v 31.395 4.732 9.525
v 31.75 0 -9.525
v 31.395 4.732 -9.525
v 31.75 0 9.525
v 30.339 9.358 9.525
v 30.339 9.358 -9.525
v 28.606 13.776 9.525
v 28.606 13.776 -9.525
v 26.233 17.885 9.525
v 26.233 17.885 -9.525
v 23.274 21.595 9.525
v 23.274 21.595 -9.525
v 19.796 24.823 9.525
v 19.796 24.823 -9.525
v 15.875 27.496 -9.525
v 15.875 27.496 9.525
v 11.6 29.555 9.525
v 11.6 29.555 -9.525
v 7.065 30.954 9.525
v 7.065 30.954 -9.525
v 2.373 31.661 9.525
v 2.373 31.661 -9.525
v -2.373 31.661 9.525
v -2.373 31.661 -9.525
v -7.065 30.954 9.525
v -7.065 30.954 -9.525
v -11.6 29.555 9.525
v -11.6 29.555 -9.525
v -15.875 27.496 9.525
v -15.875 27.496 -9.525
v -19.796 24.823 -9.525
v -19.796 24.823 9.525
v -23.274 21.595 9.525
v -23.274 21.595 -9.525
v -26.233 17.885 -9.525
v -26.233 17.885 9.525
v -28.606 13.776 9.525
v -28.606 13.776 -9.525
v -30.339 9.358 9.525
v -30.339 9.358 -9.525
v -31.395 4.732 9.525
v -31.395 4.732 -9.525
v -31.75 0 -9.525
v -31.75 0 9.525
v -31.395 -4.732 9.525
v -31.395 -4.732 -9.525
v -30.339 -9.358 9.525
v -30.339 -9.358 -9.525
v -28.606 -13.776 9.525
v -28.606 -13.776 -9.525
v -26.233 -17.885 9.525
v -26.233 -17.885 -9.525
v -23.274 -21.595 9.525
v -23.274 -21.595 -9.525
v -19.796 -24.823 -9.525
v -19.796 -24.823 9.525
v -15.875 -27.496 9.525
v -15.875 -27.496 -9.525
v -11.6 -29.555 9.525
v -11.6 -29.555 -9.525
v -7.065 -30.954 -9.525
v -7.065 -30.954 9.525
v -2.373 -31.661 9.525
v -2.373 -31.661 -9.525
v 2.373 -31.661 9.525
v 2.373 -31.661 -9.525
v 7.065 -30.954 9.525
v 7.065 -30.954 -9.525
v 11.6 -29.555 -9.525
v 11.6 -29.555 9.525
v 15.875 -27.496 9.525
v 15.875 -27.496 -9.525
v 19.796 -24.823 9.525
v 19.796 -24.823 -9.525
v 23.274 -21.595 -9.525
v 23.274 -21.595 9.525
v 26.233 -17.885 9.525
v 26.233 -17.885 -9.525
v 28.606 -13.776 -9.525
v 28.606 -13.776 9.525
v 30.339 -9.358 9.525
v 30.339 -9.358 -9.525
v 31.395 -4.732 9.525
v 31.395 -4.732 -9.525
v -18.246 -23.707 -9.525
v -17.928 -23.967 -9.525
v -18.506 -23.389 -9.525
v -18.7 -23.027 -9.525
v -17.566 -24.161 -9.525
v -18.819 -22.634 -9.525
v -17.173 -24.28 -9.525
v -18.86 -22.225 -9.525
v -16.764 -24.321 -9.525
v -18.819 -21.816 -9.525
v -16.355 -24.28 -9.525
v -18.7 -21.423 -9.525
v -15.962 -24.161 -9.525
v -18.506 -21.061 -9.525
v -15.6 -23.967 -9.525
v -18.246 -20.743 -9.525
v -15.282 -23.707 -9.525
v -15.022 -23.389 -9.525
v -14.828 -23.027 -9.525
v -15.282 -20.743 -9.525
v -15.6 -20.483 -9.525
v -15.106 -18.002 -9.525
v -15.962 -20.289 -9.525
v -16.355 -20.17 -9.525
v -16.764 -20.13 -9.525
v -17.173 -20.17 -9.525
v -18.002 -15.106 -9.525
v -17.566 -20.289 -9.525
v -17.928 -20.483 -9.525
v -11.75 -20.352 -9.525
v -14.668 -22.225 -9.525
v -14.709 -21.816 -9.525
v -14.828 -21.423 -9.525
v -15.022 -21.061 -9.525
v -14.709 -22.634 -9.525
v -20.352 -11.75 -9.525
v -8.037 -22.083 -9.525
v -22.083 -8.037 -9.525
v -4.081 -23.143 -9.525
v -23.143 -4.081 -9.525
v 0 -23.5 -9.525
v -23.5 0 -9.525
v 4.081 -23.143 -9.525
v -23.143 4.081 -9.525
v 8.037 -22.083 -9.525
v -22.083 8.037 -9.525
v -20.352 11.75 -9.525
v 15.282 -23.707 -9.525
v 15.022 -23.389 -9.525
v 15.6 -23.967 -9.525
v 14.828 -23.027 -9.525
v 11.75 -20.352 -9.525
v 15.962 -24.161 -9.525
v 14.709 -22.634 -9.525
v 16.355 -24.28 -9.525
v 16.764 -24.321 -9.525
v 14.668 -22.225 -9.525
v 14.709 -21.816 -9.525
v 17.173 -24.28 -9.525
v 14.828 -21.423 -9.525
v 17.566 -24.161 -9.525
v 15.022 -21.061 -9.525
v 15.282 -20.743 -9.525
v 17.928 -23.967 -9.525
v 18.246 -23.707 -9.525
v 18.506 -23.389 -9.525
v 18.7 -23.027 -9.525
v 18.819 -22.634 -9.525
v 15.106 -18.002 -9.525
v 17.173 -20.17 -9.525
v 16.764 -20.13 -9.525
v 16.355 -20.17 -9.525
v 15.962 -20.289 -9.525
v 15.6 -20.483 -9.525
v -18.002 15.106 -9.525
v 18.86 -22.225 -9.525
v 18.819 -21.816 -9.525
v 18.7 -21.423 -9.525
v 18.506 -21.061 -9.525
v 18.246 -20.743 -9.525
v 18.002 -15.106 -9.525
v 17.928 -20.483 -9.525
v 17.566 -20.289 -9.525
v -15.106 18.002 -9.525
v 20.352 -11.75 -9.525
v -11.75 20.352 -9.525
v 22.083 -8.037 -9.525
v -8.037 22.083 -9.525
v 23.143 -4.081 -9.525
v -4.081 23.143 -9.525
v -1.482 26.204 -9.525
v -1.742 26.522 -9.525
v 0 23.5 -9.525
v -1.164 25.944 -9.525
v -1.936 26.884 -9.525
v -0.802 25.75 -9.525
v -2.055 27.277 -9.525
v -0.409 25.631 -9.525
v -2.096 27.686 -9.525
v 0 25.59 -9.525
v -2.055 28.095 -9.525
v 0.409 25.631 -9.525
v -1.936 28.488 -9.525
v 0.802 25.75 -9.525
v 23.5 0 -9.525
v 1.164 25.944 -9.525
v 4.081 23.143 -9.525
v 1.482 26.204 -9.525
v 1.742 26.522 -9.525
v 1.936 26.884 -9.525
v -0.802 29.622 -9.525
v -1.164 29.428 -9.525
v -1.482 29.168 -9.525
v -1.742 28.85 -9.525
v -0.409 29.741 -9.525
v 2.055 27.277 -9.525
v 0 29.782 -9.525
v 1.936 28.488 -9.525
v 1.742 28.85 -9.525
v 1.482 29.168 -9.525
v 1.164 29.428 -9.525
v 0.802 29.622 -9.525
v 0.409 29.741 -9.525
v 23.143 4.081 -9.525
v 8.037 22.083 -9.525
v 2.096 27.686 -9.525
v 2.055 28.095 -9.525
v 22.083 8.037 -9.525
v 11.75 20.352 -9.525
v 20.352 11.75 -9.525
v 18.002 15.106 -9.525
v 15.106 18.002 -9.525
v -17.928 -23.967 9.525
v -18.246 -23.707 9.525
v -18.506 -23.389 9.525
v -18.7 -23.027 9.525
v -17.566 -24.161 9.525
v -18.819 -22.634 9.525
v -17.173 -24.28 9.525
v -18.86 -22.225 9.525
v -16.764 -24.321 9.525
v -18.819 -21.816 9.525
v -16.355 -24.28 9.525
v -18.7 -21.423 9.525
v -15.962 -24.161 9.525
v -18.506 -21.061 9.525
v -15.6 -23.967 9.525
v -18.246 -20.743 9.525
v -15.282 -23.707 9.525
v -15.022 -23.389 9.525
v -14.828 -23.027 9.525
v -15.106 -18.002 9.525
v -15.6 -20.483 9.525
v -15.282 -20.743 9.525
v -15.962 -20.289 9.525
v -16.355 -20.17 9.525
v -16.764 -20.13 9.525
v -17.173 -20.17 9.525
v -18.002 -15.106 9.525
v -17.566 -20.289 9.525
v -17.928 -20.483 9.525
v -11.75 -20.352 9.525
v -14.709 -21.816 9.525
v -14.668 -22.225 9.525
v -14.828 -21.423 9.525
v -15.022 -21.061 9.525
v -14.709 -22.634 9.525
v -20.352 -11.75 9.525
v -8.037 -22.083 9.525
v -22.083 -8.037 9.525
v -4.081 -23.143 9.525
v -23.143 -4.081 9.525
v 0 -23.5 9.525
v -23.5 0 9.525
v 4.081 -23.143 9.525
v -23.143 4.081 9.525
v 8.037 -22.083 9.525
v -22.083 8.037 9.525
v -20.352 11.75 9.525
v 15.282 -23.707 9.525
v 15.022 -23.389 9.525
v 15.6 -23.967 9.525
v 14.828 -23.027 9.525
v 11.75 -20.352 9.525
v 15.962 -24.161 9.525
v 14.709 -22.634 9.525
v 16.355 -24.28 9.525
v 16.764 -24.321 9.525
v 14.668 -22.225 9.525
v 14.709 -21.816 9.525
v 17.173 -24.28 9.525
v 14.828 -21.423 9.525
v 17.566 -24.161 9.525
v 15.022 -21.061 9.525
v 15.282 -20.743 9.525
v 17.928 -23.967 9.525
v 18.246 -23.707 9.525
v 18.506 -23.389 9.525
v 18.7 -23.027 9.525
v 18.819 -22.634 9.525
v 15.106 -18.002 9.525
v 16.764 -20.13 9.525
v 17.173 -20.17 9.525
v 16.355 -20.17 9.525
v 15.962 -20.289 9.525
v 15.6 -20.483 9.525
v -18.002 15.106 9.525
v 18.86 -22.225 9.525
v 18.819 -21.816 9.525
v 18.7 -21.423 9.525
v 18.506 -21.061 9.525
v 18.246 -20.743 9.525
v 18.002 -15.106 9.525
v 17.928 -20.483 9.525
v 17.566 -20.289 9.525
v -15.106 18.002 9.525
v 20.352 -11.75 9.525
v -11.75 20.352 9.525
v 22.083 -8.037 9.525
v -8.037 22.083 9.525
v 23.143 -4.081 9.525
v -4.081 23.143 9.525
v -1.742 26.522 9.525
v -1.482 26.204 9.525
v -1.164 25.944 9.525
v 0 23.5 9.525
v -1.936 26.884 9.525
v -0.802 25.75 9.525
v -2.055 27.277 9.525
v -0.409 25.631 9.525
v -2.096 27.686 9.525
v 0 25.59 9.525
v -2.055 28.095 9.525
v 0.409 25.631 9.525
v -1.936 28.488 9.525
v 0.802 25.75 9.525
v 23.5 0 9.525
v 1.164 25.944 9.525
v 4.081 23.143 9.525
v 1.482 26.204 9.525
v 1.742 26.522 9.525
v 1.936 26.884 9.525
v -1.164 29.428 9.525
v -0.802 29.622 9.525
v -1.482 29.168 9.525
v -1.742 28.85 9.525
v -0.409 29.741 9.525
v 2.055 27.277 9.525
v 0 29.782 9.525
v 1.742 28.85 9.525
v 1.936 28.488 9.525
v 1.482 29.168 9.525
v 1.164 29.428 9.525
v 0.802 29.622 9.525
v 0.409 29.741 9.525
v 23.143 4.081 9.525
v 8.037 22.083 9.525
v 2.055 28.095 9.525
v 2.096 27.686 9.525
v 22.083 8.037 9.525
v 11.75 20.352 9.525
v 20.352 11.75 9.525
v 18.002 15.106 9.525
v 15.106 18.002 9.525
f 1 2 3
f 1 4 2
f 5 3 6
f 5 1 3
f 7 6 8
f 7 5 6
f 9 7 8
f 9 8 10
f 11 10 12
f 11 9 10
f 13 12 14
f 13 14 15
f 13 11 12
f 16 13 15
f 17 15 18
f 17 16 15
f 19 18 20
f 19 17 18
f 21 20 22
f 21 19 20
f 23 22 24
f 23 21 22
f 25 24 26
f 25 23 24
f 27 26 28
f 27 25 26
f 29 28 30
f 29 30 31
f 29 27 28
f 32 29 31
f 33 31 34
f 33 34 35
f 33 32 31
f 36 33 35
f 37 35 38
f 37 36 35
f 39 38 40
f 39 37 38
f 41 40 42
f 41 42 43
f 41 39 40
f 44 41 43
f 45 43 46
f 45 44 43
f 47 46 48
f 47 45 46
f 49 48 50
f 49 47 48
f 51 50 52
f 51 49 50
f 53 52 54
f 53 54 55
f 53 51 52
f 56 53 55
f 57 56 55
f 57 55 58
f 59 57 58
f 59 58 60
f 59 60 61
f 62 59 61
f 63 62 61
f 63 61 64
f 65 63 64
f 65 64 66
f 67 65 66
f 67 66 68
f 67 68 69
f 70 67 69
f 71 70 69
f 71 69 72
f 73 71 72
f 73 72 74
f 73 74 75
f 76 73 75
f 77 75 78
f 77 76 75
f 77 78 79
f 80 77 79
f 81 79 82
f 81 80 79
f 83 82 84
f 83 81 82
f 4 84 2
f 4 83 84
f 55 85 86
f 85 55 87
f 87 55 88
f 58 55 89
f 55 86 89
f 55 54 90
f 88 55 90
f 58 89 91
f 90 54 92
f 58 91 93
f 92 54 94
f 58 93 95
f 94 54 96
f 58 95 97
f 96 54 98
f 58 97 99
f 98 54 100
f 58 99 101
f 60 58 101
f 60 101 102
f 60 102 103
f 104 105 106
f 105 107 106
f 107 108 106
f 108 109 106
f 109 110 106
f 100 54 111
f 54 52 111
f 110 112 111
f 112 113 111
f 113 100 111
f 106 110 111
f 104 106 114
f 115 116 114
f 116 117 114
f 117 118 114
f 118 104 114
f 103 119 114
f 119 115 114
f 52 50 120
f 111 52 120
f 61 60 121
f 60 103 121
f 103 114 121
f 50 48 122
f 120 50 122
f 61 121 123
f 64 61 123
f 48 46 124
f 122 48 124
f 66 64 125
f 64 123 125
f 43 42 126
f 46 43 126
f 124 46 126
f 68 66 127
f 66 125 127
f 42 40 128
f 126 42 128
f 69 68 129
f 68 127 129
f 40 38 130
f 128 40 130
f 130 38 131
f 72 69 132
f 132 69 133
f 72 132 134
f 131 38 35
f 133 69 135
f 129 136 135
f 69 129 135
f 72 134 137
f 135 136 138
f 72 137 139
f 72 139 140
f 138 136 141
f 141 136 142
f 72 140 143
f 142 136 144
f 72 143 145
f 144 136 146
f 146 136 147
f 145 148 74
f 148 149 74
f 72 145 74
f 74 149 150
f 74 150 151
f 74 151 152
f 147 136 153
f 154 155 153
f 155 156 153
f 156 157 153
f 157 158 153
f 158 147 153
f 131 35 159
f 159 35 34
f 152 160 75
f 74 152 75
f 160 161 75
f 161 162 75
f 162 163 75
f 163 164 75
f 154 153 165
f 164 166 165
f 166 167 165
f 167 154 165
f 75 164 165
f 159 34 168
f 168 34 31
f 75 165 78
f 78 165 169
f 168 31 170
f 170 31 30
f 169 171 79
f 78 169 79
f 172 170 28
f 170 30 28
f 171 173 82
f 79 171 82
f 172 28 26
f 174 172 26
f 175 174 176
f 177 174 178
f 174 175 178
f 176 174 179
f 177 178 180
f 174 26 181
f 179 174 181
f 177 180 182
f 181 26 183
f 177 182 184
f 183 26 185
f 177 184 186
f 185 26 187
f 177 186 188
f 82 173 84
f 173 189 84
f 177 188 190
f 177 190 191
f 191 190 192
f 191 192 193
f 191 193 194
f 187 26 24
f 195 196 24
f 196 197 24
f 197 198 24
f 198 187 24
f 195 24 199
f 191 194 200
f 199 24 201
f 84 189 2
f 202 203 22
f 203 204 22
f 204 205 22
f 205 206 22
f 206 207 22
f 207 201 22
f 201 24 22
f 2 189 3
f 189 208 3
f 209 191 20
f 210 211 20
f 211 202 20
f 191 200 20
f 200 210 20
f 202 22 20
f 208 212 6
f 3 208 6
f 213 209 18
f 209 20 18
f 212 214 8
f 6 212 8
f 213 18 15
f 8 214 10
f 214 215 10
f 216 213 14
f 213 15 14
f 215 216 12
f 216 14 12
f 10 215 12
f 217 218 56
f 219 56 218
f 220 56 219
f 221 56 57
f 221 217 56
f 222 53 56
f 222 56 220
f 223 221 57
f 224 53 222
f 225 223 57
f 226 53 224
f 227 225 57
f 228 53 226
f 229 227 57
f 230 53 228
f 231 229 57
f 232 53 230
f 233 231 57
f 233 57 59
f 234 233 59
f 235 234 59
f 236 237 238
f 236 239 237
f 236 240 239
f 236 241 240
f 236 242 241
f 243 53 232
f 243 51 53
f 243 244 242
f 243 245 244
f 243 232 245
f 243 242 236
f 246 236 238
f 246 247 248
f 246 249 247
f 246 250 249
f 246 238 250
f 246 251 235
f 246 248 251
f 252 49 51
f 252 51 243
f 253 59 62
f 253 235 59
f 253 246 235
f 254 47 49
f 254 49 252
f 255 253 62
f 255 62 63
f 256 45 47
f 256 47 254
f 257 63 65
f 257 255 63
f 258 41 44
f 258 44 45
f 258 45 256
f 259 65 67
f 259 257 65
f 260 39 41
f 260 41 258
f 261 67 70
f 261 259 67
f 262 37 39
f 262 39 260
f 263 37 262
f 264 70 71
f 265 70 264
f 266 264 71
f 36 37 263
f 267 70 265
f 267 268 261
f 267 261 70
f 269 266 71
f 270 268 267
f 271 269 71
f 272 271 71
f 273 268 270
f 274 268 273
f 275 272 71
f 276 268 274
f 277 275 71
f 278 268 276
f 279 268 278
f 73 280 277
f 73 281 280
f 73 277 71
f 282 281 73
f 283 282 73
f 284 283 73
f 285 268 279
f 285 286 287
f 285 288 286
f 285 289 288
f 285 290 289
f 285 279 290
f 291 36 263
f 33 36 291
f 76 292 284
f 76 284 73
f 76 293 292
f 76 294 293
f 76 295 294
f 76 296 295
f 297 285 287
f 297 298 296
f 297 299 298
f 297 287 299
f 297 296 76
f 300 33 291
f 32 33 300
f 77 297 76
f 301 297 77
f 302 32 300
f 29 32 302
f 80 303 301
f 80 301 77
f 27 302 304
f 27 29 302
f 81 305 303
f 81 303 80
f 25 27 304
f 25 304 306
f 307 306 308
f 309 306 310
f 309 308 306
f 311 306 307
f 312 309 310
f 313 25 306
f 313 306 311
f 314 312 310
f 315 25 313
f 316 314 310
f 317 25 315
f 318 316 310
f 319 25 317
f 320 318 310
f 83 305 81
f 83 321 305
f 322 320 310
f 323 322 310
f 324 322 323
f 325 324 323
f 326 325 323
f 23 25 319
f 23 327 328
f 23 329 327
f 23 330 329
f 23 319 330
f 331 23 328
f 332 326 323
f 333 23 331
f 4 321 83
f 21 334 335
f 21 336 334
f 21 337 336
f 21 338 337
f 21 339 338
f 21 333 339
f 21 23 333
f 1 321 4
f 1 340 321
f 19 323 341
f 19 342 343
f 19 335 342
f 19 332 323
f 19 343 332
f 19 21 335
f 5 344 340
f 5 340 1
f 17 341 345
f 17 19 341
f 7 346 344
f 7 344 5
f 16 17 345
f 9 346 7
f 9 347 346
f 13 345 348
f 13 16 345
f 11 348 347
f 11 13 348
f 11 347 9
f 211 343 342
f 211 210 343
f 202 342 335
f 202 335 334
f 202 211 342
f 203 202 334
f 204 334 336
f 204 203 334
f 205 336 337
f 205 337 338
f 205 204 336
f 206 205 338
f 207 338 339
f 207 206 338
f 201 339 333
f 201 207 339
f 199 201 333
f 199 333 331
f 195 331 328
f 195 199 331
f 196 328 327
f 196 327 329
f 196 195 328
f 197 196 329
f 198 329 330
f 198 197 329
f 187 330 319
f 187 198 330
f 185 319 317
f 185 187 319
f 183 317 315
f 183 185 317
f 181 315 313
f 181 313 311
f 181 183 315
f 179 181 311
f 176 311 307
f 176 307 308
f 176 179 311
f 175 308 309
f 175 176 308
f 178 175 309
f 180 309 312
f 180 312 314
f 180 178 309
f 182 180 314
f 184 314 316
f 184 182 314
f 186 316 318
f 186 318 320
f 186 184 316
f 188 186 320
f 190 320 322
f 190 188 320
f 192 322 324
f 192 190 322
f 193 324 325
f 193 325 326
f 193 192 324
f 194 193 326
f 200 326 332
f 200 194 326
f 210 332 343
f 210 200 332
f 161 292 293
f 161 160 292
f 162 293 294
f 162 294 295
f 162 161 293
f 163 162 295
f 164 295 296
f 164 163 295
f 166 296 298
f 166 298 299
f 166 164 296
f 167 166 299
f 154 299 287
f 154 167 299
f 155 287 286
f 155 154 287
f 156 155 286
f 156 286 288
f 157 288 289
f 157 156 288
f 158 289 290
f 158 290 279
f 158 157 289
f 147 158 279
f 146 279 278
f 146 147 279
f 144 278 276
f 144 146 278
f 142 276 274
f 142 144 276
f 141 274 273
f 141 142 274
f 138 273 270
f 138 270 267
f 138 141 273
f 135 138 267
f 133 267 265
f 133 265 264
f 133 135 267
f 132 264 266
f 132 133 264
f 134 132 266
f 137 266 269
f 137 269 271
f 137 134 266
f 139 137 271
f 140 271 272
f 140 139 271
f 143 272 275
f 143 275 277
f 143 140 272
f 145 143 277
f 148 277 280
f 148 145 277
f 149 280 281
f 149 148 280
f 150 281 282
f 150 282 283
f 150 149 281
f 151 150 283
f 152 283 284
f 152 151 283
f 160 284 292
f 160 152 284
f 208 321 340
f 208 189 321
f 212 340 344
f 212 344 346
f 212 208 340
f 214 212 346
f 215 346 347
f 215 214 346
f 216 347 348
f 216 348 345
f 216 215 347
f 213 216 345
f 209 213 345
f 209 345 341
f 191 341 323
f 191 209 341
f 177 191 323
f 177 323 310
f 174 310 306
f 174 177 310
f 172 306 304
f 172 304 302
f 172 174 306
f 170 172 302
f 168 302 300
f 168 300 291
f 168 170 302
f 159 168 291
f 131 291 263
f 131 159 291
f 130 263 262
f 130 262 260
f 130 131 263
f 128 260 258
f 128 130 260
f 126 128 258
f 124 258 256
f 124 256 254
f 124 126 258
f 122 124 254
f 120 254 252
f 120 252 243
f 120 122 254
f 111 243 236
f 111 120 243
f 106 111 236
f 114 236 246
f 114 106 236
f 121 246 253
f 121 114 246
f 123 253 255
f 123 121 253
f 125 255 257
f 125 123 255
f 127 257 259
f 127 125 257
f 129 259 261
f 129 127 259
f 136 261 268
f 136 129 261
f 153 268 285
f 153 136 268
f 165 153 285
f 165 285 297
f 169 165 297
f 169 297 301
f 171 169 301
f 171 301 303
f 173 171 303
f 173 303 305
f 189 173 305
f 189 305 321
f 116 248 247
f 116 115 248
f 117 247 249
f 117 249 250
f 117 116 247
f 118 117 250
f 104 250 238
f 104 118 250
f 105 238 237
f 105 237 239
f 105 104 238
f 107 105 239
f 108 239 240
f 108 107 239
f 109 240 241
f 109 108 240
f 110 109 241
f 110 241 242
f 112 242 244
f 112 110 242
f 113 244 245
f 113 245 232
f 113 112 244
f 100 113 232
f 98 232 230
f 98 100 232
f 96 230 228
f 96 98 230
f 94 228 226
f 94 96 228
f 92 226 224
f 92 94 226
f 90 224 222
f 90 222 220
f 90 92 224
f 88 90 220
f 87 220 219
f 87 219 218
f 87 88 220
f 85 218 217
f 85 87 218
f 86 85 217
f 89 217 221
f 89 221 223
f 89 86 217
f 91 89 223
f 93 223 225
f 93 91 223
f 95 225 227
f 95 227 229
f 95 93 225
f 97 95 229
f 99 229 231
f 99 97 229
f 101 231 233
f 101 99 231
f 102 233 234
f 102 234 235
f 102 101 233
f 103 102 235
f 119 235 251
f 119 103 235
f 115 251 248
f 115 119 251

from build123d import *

# Parameters (mm, degrees)
F0_R     = 31.75
F0_R_2   = 2.0955
F0_R_3   = 23.5
F1_DEPTH = 9.525


with BuildPart() as f1:
    # F0 (on Top) → F1 (new body, symmetric)
    with BuildSketch(Plane.XY):
        Circle(F0_R)
        with Locations((-16.764, -22.225)):
            Circle(F0_R_2, mode=Mode.SUBTRACT)
        with Locations((16.764, -22.225)):
            Circle(F0_R_2, mode=Mode.SUBTRACT)
        Circle(F0_R_3, mode=Mode.SUBTRACT)
        with Locations((0, 27.686)):
            Circle(F0_R_2, mode=Mode.SUBTRACT)
    extrude(amount=F1_DEPTH, both=True)


solid = f1.part
